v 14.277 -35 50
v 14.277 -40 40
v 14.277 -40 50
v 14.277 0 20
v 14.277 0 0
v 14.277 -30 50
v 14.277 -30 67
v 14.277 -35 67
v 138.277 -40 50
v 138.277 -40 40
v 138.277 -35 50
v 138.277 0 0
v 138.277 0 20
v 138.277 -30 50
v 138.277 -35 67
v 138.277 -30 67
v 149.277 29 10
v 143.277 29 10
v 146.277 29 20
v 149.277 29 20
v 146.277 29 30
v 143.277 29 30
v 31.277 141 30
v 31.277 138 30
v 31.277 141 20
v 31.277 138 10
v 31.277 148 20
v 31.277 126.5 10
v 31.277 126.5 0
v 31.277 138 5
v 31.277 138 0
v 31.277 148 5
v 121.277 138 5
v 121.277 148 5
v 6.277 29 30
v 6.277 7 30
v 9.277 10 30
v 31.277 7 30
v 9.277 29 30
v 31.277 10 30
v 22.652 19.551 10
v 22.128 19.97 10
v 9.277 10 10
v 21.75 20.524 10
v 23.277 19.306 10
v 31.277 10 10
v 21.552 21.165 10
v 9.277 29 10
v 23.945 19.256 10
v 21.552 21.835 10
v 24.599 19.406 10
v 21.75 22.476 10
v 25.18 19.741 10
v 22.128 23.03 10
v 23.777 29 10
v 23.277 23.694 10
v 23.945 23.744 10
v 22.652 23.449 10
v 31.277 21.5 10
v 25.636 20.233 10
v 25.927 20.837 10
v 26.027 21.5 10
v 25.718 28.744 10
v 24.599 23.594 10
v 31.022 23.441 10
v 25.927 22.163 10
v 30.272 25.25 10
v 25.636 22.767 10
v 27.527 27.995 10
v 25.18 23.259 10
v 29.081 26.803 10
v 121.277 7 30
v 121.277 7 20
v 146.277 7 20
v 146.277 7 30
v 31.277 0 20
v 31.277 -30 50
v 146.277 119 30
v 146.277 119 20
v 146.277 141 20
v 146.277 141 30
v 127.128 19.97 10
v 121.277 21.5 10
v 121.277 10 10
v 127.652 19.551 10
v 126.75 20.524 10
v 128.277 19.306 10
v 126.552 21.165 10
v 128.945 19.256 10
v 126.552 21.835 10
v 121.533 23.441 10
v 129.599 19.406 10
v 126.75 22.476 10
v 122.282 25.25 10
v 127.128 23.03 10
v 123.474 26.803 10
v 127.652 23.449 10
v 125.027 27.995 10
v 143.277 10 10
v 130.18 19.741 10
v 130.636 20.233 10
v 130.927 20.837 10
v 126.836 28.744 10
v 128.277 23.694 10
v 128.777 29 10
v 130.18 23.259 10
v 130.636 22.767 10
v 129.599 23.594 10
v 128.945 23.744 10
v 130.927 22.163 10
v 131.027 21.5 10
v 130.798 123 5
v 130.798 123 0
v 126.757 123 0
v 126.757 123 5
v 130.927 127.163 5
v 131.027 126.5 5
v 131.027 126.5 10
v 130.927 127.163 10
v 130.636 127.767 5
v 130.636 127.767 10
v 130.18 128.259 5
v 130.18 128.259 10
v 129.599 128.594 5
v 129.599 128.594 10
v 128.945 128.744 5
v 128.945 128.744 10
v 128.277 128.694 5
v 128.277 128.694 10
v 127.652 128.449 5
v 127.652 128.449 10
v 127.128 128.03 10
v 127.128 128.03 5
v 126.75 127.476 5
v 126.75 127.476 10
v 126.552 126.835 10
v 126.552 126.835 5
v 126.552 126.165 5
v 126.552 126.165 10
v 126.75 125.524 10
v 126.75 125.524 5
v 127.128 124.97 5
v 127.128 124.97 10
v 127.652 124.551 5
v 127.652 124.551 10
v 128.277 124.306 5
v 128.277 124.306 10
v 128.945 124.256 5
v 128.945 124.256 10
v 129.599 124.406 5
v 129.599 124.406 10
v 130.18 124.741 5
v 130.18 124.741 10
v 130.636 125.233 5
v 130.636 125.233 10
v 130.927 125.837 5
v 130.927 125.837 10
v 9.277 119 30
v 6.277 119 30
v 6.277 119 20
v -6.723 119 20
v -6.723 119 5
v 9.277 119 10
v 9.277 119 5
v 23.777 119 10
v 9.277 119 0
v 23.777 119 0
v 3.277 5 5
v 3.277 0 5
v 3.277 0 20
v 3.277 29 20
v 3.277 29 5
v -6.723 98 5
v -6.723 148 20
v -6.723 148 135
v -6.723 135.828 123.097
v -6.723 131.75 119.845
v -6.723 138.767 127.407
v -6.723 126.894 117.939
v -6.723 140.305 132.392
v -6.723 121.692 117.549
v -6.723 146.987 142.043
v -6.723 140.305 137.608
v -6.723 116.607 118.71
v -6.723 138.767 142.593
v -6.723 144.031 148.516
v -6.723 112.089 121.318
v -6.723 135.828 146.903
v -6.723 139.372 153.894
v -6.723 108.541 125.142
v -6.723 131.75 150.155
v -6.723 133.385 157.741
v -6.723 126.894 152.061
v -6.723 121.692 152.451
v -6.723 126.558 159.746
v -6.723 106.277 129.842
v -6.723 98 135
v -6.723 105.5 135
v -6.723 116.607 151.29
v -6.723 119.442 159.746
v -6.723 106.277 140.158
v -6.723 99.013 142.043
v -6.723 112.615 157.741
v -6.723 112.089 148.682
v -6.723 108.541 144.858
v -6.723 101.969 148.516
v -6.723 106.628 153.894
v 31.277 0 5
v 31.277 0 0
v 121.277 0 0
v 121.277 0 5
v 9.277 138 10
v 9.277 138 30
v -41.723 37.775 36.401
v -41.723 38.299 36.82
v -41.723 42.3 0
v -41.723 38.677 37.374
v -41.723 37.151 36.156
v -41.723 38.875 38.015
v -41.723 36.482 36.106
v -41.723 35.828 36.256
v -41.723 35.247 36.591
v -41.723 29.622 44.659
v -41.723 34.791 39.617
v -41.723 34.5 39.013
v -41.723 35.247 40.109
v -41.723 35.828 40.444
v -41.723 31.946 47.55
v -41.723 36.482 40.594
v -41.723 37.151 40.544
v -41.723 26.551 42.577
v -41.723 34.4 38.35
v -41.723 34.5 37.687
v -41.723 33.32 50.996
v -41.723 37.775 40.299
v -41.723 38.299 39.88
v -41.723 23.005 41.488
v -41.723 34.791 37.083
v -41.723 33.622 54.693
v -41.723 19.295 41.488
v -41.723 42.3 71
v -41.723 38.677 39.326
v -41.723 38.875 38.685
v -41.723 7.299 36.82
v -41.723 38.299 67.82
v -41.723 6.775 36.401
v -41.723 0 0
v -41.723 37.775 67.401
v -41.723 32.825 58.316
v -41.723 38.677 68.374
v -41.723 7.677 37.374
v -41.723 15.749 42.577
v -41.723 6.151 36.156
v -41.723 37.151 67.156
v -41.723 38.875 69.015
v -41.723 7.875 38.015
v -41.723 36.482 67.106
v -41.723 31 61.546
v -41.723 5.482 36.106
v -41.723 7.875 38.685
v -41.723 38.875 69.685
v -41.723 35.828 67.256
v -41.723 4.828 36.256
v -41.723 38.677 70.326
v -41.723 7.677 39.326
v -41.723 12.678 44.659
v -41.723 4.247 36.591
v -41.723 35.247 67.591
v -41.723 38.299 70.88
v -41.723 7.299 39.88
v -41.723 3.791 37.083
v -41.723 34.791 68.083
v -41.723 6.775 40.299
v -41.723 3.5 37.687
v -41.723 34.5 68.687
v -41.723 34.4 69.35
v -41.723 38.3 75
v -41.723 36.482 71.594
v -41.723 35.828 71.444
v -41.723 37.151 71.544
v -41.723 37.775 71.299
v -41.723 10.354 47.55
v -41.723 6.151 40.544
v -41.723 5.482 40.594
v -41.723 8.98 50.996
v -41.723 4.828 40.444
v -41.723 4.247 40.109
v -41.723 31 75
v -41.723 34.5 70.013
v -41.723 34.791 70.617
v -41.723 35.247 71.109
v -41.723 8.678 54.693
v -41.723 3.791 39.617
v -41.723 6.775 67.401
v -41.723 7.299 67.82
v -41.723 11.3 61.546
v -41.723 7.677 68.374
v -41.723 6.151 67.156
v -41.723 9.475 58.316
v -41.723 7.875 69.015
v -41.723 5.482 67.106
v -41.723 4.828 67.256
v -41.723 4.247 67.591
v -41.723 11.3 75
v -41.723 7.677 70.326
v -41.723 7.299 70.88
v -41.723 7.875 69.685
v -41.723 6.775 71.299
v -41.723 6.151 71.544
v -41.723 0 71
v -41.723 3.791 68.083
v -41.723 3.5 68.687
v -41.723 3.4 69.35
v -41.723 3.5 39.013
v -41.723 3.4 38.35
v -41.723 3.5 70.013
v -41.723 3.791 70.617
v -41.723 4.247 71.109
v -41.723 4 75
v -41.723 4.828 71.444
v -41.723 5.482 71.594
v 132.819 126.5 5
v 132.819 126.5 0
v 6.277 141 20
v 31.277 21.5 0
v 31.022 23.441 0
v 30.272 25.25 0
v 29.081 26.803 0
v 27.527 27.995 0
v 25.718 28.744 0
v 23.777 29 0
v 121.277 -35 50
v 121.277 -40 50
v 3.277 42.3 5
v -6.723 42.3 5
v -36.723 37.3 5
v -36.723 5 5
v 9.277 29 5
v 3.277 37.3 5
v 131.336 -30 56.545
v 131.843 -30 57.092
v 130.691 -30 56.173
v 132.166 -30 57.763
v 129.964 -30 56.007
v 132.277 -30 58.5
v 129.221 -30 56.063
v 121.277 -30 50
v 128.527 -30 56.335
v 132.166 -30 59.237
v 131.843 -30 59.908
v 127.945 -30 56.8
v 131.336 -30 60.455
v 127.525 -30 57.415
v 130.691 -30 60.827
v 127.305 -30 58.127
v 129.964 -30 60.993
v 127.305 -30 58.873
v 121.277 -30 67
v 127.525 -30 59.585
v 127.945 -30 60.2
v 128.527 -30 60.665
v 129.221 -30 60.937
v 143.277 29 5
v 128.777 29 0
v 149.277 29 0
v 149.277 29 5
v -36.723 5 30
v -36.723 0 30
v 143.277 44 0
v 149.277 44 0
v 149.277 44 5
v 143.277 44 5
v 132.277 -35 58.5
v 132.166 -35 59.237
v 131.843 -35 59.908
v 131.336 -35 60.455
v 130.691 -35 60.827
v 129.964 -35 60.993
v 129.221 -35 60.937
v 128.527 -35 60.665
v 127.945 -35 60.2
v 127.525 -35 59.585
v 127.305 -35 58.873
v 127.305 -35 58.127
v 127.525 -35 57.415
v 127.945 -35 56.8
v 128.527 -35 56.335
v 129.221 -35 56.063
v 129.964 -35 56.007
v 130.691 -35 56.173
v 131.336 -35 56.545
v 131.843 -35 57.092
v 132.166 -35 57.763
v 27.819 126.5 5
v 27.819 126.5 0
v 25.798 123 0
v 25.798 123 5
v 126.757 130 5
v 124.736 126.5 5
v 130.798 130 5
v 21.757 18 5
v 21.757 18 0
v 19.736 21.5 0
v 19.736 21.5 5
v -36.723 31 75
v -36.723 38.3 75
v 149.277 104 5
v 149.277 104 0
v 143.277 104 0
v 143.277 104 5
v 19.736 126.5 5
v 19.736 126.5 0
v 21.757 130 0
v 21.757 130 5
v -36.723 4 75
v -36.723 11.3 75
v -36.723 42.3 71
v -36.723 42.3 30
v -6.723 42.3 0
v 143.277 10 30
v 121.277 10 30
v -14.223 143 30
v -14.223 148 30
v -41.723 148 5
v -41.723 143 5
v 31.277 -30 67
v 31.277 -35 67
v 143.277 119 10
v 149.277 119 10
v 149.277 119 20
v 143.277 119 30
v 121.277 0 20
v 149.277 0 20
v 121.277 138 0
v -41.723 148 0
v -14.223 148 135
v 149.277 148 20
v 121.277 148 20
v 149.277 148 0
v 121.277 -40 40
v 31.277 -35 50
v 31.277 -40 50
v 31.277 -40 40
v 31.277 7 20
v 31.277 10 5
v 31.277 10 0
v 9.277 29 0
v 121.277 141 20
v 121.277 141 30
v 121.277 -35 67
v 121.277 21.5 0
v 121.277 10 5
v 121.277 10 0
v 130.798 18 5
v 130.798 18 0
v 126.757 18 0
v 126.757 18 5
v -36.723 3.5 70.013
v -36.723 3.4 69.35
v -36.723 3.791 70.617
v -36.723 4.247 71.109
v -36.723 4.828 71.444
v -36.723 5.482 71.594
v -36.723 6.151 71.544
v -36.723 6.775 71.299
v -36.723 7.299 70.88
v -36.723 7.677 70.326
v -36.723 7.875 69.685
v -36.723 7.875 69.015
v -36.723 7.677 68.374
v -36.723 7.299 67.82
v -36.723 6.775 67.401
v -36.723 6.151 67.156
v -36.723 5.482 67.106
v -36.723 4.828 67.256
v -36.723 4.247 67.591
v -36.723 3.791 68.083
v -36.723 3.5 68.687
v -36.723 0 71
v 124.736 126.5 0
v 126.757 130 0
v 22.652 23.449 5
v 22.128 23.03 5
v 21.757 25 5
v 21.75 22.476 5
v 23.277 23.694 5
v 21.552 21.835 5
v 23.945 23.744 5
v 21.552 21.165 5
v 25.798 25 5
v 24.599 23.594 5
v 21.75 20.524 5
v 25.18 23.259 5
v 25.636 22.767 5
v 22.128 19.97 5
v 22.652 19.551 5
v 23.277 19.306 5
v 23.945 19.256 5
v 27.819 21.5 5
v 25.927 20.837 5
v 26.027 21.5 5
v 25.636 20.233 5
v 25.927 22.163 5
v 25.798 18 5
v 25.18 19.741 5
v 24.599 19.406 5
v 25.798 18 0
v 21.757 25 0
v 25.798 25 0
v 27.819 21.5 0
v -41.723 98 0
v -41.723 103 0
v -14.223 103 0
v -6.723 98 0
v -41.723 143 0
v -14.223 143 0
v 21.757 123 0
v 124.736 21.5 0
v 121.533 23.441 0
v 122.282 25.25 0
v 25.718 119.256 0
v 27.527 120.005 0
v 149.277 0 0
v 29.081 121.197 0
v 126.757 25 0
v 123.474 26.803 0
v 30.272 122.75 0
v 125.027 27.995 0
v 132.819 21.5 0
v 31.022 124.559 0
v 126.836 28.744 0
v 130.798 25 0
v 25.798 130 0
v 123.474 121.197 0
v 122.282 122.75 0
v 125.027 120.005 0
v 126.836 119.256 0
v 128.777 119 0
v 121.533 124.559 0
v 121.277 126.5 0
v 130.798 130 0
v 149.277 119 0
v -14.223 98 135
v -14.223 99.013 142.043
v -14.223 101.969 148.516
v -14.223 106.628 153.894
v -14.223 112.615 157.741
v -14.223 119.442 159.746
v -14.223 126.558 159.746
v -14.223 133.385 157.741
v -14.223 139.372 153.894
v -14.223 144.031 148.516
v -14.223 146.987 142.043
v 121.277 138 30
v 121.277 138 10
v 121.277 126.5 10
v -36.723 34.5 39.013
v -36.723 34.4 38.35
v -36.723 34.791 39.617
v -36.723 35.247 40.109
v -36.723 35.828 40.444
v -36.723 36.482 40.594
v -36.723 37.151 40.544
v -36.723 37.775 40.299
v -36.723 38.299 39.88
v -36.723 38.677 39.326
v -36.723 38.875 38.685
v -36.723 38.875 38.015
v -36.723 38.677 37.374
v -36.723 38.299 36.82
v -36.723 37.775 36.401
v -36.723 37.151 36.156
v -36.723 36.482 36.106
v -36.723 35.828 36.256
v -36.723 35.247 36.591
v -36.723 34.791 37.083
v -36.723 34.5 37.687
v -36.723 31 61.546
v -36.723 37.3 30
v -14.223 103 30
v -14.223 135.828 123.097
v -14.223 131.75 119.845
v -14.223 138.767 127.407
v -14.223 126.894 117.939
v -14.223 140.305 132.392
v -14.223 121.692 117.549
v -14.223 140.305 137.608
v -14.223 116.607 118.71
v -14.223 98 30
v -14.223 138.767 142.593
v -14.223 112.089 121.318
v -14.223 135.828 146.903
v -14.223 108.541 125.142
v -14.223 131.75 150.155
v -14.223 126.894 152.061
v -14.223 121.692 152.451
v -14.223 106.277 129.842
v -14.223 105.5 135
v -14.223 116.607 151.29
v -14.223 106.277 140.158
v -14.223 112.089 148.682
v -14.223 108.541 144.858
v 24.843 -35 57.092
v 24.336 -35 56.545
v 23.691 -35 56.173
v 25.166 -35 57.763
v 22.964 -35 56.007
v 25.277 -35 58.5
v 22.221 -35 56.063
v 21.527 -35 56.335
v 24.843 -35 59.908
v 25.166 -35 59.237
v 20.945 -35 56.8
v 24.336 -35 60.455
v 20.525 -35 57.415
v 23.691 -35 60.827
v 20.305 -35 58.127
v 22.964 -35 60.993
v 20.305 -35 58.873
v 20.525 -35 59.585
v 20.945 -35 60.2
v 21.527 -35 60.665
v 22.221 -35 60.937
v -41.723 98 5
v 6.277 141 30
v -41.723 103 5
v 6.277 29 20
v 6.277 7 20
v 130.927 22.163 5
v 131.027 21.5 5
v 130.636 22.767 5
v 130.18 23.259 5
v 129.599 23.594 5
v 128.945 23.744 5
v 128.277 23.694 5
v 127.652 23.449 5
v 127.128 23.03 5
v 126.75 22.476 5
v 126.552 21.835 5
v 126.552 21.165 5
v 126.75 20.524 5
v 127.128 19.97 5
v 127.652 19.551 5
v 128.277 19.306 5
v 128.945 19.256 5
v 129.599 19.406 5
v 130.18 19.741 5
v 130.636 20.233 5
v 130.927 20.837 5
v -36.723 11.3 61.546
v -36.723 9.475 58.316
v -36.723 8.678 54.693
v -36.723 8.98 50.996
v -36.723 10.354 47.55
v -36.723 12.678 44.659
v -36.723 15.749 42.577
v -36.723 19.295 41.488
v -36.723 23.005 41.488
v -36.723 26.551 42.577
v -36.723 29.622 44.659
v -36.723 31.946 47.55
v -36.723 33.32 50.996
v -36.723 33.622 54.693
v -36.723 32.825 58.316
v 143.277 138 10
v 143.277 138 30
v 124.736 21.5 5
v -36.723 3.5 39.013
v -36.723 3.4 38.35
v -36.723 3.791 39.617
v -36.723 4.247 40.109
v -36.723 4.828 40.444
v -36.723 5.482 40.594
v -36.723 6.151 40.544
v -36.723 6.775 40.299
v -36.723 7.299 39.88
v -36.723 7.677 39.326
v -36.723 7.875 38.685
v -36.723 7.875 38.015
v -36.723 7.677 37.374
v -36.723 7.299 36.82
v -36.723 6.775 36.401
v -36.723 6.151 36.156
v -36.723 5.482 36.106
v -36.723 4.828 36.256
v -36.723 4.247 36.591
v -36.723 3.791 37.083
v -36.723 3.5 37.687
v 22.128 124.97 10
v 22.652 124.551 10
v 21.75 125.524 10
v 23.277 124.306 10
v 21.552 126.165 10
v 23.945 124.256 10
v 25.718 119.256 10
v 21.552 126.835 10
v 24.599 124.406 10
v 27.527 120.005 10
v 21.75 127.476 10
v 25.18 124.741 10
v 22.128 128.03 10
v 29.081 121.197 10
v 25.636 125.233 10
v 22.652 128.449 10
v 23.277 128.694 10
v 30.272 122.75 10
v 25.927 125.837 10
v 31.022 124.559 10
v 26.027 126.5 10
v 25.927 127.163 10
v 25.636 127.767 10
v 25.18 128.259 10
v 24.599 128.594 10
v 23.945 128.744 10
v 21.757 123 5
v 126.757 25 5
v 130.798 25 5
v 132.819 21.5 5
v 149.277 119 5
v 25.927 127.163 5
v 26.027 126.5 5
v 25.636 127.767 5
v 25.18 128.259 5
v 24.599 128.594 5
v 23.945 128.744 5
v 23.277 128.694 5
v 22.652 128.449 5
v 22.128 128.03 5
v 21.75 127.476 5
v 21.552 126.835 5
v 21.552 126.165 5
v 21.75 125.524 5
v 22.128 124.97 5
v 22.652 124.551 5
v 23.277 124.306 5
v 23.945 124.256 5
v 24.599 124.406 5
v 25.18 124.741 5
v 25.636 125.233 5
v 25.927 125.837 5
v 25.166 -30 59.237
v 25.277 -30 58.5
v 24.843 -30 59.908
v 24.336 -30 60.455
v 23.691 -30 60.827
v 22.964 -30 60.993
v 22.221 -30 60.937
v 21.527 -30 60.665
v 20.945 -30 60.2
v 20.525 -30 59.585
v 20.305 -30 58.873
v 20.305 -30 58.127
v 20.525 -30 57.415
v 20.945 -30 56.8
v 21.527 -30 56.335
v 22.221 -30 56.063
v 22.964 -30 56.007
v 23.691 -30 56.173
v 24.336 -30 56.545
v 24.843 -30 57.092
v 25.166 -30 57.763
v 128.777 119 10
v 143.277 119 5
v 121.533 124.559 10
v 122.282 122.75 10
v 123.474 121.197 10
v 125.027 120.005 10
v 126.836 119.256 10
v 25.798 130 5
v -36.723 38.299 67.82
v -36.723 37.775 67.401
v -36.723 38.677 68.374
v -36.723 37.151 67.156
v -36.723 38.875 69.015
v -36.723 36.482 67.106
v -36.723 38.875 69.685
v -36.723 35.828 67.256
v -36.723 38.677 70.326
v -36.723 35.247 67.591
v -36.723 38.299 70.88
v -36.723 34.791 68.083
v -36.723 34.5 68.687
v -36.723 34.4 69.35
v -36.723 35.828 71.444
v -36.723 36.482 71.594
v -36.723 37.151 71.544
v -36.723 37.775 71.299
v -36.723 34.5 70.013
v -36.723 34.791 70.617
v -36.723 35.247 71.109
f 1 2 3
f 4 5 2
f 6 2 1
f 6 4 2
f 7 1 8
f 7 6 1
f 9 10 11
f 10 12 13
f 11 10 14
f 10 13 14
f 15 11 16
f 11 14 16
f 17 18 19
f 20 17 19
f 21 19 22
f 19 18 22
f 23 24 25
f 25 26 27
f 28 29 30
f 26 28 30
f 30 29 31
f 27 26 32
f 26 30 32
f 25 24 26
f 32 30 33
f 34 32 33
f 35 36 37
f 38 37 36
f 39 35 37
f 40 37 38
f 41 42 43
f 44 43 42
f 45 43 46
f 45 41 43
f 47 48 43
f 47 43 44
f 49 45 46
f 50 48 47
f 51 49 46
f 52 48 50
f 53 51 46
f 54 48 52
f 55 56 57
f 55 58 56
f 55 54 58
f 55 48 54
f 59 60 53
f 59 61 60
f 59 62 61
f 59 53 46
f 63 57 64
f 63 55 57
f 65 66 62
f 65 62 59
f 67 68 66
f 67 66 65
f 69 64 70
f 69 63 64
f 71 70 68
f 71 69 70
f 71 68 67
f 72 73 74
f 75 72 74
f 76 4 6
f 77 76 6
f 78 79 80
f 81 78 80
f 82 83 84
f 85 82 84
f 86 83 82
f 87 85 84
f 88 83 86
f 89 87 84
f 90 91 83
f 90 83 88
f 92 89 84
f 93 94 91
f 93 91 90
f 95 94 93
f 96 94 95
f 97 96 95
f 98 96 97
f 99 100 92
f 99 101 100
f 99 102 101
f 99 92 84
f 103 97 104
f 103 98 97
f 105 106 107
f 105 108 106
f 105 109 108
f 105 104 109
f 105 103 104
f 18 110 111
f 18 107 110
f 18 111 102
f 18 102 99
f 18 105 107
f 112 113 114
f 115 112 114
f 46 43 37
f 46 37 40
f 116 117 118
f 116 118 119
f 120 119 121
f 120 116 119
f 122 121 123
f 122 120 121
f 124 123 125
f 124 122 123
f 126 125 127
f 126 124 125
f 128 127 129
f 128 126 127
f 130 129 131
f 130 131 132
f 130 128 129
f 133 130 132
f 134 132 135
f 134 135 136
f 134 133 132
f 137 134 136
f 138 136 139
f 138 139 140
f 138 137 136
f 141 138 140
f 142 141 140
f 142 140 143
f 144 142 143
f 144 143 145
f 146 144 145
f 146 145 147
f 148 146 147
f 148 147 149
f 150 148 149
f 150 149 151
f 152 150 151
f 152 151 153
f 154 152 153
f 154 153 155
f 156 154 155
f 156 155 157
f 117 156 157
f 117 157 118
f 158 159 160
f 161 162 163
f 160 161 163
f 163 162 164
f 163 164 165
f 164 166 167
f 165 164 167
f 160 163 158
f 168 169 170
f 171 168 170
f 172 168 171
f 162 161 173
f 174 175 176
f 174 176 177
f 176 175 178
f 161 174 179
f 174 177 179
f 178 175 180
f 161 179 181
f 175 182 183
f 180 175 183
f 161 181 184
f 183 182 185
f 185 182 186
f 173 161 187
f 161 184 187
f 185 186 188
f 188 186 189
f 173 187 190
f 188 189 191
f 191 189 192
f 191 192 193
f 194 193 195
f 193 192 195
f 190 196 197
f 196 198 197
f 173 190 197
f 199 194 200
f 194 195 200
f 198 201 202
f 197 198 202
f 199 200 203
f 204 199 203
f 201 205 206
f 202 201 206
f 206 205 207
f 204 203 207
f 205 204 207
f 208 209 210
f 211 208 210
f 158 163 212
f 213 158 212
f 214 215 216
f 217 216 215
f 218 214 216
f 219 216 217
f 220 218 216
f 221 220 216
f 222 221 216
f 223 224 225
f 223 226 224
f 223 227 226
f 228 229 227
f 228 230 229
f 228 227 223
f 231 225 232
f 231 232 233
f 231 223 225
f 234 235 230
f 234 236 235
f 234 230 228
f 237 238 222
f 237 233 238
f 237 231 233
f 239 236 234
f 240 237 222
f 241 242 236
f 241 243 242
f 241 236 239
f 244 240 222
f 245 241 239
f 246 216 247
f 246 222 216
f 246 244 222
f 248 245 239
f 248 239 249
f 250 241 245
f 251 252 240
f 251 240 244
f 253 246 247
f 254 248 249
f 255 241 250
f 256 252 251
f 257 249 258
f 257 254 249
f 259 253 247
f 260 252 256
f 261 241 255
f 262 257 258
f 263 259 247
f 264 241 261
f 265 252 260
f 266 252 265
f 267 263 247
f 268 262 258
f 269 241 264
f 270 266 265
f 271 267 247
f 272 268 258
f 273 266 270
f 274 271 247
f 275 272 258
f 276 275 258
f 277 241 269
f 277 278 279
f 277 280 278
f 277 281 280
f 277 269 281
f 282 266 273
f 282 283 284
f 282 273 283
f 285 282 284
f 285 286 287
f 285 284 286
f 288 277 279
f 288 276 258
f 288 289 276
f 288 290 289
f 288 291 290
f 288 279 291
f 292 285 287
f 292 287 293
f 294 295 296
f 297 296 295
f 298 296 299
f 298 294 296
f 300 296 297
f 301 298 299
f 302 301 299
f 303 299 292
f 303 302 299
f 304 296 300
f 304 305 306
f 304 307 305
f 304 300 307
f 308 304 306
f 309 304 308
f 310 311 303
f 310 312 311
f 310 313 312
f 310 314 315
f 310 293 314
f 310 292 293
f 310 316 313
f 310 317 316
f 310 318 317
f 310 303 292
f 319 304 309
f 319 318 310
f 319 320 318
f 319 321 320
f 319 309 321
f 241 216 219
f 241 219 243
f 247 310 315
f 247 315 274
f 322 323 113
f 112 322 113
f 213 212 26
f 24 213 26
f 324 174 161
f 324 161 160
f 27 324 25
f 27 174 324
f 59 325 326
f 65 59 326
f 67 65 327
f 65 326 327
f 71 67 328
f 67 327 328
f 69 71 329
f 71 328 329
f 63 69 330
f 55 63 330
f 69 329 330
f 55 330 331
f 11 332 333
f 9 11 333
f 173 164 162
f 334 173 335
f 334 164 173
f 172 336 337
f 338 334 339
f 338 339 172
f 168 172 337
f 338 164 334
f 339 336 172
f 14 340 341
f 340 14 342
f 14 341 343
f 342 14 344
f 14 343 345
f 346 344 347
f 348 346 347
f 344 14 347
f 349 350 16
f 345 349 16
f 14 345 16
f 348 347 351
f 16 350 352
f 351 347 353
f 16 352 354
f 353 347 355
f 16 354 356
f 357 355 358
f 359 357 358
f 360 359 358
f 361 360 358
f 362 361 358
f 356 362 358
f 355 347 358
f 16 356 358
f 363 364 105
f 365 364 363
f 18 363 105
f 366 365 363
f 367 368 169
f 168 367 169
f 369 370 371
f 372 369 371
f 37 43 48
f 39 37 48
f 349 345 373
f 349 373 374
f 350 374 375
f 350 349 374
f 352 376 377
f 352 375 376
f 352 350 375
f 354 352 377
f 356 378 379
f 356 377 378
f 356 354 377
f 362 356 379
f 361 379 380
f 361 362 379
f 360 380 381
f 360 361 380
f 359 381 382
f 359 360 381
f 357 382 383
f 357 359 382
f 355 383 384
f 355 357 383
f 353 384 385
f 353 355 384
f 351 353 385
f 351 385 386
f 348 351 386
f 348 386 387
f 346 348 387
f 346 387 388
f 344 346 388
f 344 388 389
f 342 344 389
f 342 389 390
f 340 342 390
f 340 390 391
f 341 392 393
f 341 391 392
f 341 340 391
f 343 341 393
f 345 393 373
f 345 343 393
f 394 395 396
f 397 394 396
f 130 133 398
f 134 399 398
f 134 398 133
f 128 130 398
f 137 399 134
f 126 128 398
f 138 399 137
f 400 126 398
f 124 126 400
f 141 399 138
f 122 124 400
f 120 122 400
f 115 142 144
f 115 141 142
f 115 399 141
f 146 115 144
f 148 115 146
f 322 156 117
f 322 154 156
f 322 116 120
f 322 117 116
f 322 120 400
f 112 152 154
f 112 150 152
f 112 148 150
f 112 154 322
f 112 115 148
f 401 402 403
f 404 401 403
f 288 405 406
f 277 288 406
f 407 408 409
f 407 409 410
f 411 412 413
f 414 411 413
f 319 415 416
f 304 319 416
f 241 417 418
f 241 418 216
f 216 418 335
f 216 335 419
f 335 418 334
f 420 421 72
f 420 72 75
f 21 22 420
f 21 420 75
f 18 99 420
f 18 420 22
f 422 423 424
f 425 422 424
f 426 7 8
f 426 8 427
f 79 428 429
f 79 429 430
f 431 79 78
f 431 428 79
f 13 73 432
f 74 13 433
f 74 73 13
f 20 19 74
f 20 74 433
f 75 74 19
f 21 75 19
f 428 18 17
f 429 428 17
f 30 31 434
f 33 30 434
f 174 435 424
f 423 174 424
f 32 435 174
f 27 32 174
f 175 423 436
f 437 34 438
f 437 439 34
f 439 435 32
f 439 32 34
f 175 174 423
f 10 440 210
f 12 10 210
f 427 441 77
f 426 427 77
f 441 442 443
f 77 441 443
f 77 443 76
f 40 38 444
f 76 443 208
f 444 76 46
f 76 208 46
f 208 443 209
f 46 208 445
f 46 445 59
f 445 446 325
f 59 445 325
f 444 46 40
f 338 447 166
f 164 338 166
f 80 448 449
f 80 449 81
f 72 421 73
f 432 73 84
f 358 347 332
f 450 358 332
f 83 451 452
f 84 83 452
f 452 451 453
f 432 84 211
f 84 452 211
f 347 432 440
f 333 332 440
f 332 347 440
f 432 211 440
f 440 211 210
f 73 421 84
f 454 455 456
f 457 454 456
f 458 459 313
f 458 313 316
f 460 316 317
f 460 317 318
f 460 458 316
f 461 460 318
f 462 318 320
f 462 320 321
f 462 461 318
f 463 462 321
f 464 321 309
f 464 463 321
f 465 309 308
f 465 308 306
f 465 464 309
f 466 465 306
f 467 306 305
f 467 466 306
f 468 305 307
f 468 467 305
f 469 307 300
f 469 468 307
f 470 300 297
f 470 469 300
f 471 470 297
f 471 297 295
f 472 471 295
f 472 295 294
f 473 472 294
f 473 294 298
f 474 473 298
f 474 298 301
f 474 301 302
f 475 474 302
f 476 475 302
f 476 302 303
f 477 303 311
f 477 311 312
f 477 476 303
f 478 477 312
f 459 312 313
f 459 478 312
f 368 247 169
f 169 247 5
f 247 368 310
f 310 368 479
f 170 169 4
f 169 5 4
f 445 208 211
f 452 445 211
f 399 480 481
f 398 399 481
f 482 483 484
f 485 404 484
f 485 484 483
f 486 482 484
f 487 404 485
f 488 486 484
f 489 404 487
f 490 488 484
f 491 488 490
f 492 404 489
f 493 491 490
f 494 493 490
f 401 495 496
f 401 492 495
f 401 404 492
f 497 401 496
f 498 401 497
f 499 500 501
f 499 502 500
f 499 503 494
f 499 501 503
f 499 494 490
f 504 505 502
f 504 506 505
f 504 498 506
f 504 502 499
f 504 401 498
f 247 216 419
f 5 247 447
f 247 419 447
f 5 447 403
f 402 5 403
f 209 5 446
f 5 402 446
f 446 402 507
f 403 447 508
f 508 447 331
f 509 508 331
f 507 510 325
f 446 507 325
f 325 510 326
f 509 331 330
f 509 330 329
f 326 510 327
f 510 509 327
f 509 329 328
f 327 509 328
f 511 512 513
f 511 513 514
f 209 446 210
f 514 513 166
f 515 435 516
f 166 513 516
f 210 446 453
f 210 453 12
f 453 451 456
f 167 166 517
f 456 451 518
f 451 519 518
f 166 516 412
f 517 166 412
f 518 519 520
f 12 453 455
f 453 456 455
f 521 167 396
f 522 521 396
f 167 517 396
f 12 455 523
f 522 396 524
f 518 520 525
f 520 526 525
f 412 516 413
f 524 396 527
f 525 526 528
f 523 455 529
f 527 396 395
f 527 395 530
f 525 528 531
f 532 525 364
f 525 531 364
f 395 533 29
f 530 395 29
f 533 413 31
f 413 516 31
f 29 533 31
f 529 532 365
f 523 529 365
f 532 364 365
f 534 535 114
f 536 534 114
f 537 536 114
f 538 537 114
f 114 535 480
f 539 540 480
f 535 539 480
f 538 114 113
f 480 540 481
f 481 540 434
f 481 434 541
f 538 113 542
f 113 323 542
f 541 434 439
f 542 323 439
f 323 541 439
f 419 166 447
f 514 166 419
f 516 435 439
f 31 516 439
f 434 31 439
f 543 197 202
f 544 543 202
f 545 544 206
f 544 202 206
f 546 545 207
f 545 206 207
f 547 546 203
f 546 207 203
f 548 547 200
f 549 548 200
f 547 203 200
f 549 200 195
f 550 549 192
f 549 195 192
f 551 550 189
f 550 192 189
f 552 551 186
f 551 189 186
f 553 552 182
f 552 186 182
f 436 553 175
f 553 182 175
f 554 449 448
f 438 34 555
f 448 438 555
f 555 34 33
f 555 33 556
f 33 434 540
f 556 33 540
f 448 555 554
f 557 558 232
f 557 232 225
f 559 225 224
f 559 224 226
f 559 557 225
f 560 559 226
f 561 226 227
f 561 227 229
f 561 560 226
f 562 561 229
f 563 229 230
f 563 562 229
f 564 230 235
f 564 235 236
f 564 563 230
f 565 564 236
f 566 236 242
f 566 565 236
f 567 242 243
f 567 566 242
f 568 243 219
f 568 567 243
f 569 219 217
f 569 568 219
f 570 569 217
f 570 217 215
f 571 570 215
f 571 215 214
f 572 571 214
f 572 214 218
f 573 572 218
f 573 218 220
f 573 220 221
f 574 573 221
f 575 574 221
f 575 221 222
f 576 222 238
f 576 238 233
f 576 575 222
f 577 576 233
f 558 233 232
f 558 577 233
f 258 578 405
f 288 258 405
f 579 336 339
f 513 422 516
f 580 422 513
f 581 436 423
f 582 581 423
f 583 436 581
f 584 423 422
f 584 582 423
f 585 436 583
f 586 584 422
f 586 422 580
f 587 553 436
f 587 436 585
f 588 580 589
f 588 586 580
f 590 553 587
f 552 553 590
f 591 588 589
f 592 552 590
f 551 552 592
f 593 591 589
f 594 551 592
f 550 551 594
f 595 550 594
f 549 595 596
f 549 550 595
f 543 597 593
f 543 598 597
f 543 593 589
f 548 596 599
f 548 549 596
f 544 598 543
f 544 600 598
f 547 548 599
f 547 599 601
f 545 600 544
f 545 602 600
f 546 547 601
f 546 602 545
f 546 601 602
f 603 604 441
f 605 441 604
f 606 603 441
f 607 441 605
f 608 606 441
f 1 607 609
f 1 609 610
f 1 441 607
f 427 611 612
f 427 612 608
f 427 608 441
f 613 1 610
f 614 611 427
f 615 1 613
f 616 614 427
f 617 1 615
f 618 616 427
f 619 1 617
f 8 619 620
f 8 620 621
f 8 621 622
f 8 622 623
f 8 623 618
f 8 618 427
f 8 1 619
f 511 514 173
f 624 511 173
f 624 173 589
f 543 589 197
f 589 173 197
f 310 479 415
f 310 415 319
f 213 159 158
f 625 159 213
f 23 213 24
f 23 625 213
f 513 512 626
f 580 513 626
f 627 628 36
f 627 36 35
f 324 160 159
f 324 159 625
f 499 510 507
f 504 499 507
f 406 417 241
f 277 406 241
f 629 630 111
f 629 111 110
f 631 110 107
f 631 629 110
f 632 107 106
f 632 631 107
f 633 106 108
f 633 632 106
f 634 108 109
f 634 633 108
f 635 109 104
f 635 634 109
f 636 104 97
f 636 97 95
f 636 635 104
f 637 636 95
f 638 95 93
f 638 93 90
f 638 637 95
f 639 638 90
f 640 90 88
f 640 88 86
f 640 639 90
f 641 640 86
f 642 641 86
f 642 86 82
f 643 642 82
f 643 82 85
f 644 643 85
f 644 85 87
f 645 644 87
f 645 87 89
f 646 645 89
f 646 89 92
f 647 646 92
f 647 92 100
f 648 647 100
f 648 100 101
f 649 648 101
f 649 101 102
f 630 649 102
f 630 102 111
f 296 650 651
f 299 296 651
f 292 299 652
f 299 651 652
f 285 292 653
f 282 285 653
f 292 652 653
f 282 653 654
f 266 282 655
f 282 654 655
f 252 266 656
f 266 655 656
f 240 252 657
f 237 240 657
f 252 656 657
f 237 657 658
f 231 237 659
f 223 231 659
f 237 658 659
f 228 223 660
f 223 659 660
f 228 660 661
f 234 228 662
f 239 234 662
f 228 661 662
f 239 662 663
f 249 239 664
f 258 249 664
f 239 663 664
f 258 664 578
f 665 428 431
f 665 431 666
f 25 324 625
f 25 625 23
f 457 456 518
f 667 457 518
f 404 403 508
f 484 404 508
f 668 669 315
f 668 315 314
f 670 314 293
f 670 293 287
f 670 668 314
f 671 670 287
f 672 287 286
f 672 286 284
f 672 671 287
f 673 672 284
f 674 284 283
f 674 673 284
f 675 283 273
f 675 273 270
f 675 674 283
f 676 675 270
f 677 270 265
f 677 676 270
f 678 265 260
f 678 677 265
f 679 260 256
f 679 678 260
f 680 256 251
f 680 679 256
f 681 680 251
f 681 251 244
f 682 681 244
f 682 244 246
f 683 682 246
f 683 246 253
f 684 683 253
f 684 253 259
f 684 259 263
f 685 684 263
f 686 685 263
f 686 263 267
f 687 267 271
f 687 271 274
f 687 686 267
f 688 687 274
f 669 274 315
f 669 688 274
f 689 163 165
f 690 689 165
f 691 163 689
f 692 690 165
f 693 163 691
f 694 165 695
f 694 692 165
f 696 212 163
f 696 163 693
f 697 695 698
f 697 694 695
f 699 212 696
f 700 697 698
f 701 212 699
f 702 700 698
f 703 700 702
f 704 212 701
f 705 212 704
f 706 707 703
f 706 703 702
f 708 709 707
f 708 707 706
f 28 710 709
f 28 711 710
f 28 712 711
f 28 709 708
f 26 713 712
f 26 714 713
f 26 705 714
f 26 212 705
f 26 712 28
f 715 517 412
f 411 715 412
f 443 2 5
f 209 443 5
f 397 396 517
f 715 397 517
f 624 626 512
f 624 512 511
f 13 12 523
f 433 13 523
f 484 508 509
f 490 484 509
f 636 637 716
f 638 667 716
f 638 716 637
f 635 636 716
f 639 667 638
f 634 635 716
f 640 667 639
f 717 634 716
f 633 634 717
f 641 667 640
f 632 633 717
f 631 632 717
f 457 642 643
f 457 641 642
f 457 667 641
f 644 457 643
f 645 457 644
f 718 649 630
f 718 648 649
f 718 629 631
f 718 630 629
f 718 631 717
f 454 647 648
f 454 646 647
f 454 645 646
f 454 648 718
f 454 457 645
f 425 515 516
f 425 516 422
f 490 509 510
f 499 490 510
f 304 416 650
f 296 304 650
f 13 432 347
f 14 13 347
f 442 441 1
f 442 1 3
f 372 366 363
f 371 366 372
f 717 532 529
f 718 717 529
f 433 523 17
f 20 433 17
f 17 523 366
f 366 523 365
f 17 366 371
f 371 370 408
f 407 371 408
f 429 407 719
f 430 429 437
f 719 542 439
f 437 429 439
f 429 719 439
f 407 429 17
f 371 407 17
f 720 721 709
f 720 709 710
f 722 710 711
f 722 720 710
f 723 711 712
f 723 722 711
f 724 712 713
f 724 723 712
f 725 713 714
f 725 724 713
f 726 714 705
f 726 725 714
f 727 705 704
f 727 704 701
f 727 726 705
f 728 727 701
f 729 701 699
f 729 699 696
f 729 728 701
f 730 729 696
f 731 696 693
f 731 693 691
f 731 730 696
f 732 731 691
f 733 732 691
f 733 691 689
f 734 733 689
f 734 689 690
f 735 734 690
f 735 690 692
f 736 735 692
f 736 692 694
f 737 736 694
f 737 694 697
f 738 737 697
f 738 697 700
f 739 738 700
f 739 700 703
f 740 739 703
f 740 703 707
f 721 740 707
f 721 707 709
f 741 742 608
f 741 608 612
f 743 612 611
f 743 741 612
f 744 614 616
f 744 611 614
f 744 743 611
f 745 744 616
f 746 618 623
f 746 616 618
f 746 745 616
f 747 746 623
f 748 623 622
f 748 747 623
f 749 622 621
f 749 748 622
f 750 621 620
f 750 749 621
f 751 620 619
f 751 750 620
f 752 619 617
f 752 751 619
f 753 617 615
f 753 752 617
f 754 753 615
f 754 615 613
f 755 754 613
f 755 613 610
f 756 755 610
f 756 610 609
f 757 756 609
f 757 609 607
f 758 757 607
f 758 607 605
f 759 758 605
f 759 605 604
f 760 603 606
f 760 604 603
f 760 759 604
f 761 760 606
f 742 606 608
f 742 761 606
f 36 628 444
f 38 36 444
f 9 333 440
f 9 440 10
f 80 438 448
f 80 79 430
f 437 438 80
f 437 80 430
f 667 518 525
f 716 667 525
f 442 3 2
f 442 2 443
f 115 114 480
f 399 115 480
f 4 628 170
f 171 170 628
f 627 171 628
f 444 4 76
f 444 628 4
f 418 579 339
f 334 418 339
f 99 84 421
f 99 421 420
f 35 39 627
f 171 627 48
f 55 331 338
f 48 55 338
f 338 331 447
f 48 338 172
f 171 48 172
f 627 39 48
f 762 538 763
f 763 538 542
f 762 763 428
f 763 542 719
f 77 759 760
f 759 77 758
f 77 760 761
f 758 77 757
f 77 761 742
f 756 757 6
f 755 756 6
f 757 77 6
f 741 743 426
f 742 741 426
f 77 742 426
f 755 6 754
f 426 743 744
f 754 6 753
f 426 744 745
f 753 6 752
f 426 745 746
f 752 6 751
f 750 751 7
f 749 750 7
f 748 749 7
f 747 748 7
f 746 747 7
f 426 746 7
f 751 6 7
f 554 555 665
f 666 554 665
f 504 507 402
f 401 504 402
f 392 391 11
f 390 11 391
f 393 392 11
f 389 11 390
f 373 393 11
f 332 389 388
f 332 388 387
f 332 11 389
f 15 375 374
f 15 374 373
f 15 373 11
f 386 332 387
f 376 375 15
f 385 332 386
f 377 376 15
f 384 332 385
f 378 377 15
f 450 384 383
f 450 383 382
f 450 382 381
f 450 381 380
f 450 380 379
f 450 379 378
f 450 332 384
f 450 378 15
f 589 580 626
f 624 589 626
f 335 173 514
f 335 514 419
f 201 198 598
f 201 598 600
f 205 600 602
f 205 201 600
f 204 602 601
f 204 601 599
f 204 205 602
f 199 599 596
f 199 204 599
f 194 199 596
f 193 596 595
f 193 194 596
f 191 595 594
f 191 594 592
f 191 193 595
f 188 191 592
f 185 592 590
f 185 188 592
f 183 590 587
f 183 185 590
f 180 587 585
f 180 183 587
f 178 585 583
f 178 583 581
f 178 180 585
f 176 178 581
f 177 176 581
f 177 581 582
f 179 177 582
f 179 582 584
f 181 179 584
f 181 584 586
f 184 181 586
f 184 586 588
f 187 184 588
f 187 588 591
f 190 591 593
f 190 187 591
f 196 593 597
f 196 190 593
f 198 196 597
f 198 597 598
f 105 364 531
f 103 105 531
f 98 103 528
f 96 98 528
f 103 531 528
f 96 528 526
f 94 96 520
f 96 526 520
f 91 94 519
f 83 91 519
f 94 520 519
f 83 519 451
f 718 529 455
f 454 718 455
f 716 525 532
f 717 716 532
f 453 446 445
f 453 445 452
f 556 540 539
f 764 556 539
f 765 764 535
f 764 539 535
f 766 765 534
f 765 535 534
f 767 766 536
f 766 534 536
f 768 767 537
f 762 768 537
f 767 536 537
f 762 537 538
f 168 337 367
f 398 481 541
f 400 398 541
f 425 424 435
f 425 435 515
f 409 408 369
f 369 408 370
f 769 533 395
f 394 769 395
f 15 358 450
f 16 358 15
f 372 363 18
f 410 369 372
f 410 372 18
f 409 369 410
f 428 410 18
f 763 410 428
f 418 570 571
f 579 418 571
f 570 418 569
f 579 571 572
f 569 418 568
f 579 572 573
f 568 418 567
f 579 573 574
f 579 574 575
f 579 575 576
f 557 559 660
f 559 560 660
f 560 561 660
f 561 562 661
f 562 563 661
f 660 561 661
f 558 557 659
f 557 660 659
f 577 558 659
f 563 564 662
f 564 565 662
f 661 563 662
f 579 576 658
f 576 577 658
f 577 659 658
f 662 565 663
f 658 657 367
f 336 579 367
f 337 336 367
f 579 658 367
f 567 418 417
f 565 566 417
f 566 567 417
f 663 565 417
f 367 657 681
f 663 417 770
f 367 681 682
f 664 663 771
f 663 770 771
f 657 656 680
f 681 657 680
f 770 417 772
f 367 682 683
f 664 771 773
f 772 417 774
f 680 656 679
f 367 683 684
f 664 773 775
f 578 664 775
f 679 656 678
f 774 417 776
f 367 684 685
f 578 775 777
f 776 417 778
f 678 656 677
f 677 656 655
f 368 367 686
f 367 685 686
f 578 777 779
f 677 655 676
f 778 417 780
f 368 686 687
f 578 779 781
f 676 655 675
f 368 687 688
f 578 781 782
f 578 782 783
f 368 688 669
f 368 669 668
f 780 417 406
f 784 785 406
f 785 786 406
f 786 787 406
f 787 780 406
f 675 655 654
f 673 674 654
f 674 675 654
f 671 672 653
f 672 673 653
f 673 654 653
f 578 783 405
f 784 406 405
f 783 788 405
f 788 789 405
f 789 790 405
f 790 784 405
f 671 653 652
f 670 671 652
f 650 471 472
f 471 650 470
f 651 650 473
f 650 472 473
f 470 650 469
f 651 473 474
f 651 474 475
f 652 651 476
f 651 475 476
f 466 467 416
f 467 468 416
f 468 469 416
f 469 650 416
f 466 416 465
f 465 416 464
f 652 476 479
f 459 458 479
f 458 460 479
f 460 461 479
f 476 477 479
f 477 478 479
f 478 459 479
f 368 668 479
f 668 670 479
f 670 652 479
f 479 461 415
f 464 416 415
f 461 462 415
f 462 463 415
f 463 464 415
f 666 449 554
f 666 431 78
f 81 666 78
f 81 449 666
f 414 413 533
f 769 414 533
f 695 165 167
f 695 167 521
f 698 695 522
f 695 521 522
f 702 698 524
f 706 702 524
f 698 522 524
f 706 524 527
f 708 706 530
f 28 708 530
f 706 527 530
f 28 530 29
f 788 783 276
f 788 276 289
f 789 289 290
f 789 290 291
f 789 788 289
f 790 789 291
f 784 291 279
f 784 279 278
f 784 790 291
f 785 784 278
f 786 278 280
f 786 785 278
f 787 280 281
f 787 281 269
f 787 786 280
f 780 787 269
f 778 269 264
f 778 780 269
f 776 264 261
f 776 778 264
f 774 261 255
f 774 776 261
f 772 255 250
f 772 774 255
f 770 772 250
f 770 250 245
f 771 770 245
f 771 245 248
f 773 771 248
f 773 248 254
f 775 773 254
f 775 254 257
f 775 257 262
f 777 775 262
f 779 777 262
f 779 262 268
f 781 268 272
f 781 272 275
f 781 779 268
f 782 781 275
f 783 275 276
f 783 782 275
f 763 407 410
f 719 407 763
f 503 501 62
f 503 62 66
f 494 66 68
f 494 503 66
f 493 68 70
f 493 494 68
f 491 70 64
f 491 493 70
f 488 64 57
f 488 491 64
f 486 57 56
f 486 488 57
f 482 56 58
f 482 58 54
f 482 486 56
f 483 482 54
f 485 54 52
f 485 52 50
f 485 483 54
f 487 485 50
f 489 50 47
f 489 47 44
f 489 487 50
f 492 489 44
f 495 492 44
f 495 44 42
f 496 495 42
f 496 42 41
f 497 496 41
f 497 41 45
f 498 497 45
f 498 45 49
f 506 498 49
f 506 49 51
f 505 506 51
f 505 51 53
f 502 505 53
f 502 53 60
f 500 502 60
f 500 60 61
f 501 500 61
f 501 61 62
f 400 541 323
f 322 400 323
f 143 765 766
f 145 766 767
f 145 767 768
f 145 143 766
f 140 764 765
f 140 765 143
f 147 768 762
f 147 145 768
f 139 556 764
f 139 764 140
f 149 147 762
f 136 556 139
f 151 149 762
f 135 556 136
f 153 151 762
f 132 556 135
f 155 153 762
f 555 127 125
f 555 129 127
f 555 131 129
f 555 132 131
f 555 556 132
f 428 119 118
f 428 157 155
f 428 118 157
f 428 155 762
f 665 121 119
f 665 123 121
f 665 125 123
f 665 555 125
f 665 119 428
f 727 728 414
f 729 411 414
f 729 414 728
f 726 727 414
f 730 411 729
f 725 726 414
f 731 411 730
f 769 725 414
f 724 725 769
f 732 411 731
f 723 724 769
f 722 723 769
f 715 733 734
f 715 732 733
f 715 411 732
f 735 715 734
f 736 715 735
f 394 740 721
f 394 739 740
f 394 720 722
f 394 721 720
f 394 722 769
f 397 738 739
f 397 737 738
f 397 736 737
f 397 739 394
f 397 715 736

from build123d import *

# Parameters (mm, degrees)
F0_W      = 146
F0_H      = 148
F0_W_2    = 134
F0_H_2    = 128
F1_DEPTH  = 20
F2_W      = 140
F2_H      = 134
F2_W_2    = 134
F2_H_2    = 128
F3_DEPTH  = 10
F4_W      = 90
F4_H      = 25
F5_DEPTH  = 149.278288
F6_W      = 90
F6_H      = 25
F7_DEPTH  = 148.001
F8_W      = 17
F8_H      = 67
F8_R      = 2.5
F9_DEPTH  = 40
F10_W     = 5
F10_H     = 17
F11_DEPTH = 135.001
F12_W     = 148
F12_H     = 5
F13_DEPTH = 10
F14_R     = 17.5
F15_DEPTH = 7.5
F16_W     = 10
F16_H     = 29
F17_DEPTH = 15
F18_W     = 6
F18_H     = 90
F19_DEPTH = 5
F20_W     = 15
F20_H     = 5
F21_DEPTH = 6
F23_W     = 42.3
F23_H     = 5
F24_DEPTH = 30
F25_R     = 2.25
F26_DEPTH = 5
F27_SIZE  = 4
F28_W     = 40
F28_H     = 5
F29_DEPTH = 25
F31_DEPTH = 42.3
F32_W     = 5
F32_H     = 30
F33_DEPTH = 27.5
F35_DEPTH = 50
F36_R     = 2.25
F37_DEPTH = 10
F39_DEPTH = 5


with BuildPart() as f1:
    # F0 (on Top) → F1 (new body)
    with BuildSketch(Plane.XY):
        with Locations((76.277288, 74)):
            Rectangle(F0_W, F0_H)
        with Locations((76.277288, 74)):
            Rectangle(F0_W_2, F0_H_2, mode=Mode.SUBTRACT)
    extrude(amount=F1_DEPTH)

    # F2 (on face) → F3 (join)
    with BuildSketch(Plane.XY.offset(20)):
        with Locations((76.277288, 74)):
            Rectangle(F2_W, F2_H)
        with Locations((76.277288, 74)):
            Rectangle(F2_W_2, F2_H_2, mode=Mode.SUBTRACT)
    extrude(amount=F3_DEPTH)

    # F4 (on Right) → F5 (cut, through all)
    with BuildSketch(Plane.YZ):
        with Locations((74, 17.5)):
            Rectangle(F4_W, F4_H)
    extrude(amount=F5_DEPTH, mode=Mode.SUBTRACT)

    # F6 (on Front) → F7 (cut, through all)
    with BuildSketch(Plane.XZ):
        with Locations((76.277288, 17.5)):
            Rectangle(F6_W, F6_H)
    extrude(amount=-F7_DEPTH, mode=Mode.SUBTRACT)

    # F8 (on face) → F9 (join)
    with BuildSketch(Plane.XZ):
        with Locations((22.777288, 33.5)):
            Rectangle(F8_W, F8_H)
        with Locations((22.777288, 58.5)):
            Circle(F8_R, mode=Mode.SUBTRACT)
        with Locations((129.777288, 33.5)):
            Rectangle(F8_W, F8_H)
        with Locations((129.777288, 58.5)):
            Circle(F8_R, mode=Mode.SUBTRACT)
    extrude(amount=F9_DEPTH)

    # F10 (on face) → F11 (cut, through all)
    with BuildSketch(Plane(origin=(14.277288, 0, 0), x_dir=(0, -1, 0), z_dir=(-1, 0, 0))):
        Polygon((0, 67), (0, 20), (30, 50), (30, 67), align=None)
        with Locations((37.5, 58.5)):
            Rectangle(F10_W, F10_H)
        Polygon((40, 40), (0, 0), (40, 0), align=None)
    extrude(amount=-F11_DEPTH, mode=Mode.SUBTRACT)

    # F12 (on face) → F13 (join)
    with BuildSketch(Plane(origin=(3.277288, 0, 0), x_dir=(0, -1, 0), z_dir=(-1, 0, 0))):
        with Locations((-74, 2.5)):
            Rectangle(F12_W, F12_H)
    extrude(amount=F13_DEPTH)

    # F14 (on face) → F15 (join)
    with BuildSketch(Plane(origin=(-6.722712, 0, 0), x_dir=(0, -1, 0), z_dir=(-1, 0, 0))):
        with BuildLine():
            Line((-148, 135), (-148, 0))
            Line((-148, 0), (-98, 0))
            Line((-98, 0), (-98, 135))
            ThreePointArc((-98, 135), (-123, 160), (-148, 135))
        make_face()
        with Locations((-123, 135)):
            Circle(F14_R, mode=Mode.SUBTRACT)
    extrude(amount=F15_DEPTH)

    # F16 (on face) → F17 (join, through all)
    with BuildSketch(Plane.XY.offset(5)):
        with Locations((-1.722712, 133.5)):
            Rectangle(F16_W, F16_H)
    extrude(amount=F17_DEPTH)

    # F18 (on face) → F19 (join)
    with BuildSketch(Plane.XY.offset(5)):
        with Locations((146.277288, 74)):
            Rectangle(F18_W, F18_H)
    extrude(amount=F19_DEPTH)

    # F20 (on face) → F21 (cut, through all)
    with BuildSketch(Plane.YZ.offset(149.277288)):
        with Locations((36.5, 2.5)):
            Rectangle(F20_W, F20_H)
        with Locations((111.5, 2.5)):
            Rectangle(F20_W, F20_H)
    extrude(amount=-F21_DEPTH, mode=Mode.SUBTRACT)

    # F23 (on face) → F24 (join)
    with BuildSketch(Plane(origin=(-6.722712, 0, 0), x_dir=(0, -1, 0), z_dir=(-1, 0, 0))):
        with Locations((-21.15, 2.5)):
            Rectangle(F23_W, F23_H)
    extrude(amount=F24_DEPTH)

    # F25 (on face) → F26 (join)
    with BuildSketch(Plane(origin=(-36.722712, 0, 0), x_dir=(0, -1, 0), z_dir=(-1, 0, 0))):
        with BuildLine():
            Line((-42.3, 75), (-42.3, 0))
            Line((-42.3, 0), (0, 0))
            Line((0, 0), (0, 75))
            Line((0, 75), (-11.3, 75))
            Line((-11.3, 75), (-11.3, 61.54594))
            ThreePointArc((-11.3, 61.54594), (-21.15, 41.35), (-31, 61.54594))
            Line((-31, 61.54594), (-31, 75))
            Line((-31, 75), (-42.3, 75))
        make_face()
        with Locations((-36.65, 38.35)):
            Circle(F25_R, mode=Mode.SUBTRACT)
        with Locations((-36.65, 69.35)):
            Circle(F25_R, mode=Mode.SUBTRACT)
        with Locations((-5.65, 38.35)):
            Circle(F25_R, mode=Mode.SUBTRACT)
        with Locations((-5.65, 69.35)):
            Circle(F25_R, mode=Mode.SUBTRACT)
    extrude(amount=F26_DEPTH)

    # F27
    f27_edges = [f1.edges().sort_by_distance(p)[0] for p in [
        (-39.222712, 42.3, 75),
        (-39.222712, 0, 75),
    ]]
    chamfer(f27_edges, length=F27_SIZE)

    # F28 (on face) → F29 (join)
    with BuildSketch(Plane.XY.offset(5)):
        with Locations((-16.722712, 39.8)):
            Rectangle(F28_W, F28_H)
        with Locations((-16.722712, 2.5)):
            Rectangle(F28_W, F28_H)
    extrude(amount=F29_DEPTH)

    # F30 (on face) → F31 (cut, through all)
    with BuildSketch(Plane.XZ):
        Polygon((3.277288, 30), (-36.722712, 30), (3.277288, 5), align=None)
    extrude(amount=-F31_DEPTH, mode=Mode.SUBTRACT)

    # F32 (on face) → F33 (join, through all)
    with BuildSketch(Plane(origin=(-14.222712, 0, 0), x_dir=(0, -1, 0), z_dir=(-1, 0, 0))):
        with Locations((-145.5, 15)):
            Rectangle(F32_W, F32_H)
        with Locations((-100.5, 15)):
            Rectangle(F32_W, F32_H)
    extrude(amount=F33_DEPTH)

    # F34 (on face) → F35 (cut, through all)
    with BuildSketch(Plane(origin=(0, 148, 0), x_dir=(-1, 0, 0), z_dir=(0, 1, 0))):
        Polygon((41.722712, 5), (41.722712, 30), (14.222712, 30), align=None)
    extrude(amount=-F35_DEPTH, mode=Mode.SUBTRACT)

    # F36 (on Top) → F37 (join)
    with BuildSketch(Plane.XY):
        with BuildLine():
            Line((31.277288, 10), (31.277288, 21.5))
            ThreePointArc((31.277288, 21.5), (29.080588, 26.803301), (23.777288, 29))
            Line((23.777288, 29), (9.277288, 29))
            Line((9.277288, 29), (9.277288, 10))
            Line((9.277288, 10), (31.277288, 10))
        make_face()
        with Locations((23.777288, 21.5)):
            Circle(F36_R, mode=Mode.SUBTRACT)
        with BuildLine():
            Line((121.277288, 21.5), (121.277288, 10))
            Line((121.277288, 10), (143.277288, 10))
            Line((143.277288, 10), (143.277288, 29))
            Line((143.277288, 29), (128.777288, 29))
            ThreePointArc((128.777288, 29), (123.473987, 26.803301), (121.277288, 21.5))
        make_face()
        with Locations((128.777288, 21.5)):
            Circle(F36_R, mode=Mode.SUBTRACT)
        with BuildLine():
            Line((143.277288, 138), (121.277288, 138))
            Line((121.277288, 138), (121.277288, 126.5))
            ThreePointArc((121.277288, 126.5), (123.473987, 121.196699), (128.777288, 119))
            Line((128.777288, 119), (143.277288, 119))
            Line((143.277288, 119), (143.277288, 138))
        make_face()
        with Locations((128.777288, 126.5)):
            Circle(F36_R, mode=Mode.SUBTRACT)
        with BuildLine():
            Line((31.277288, 126.5), (31.277288, 138))
            Line((31.277288, 138), (9.277288, 138))
            Line((9.277288, 138), (9.277288, 119))
            Line((9.277288, 119), (23.777288, 119))
            ThreePointArc((23.777288, 119), (29.080588, 121.196699), (31.277288, 126.5))
        make_face()
        with Locations((23.777288, 126.5)):
            Circle(F36_R, mode=Mode.SUBTRACT)
    extrude(amount=F37_DEPTH)

    # F38 (on face) → F39 (cut)
    with BuildSketch(Plane(origin=(0, 0, 0), x_dir=(1, 0, 0), z_dir=(0, 0, -1))):
        Polygon((25.798014, -18), (21.756562, -18), (19.735836, -21.5), (21.756562, -25), (25.798014, -25), (27.818739, -21.5), align=None)
        Polygon((126.756562, -18), (124.735836, -21.5), (126.756562, -25), (130.798014, -25), (132.818739, -21.5), (130.798014, -18), align=None)
        Polygon((126.756562, -130), (130.798014, -130), (132.818739, -126.5), (130.798014, -123), (126.756562, -123), (124.735836, -126.5), align=None)
        Polygon((25.798014, -130), (27.818739, -126.5), (25.798014, -123), (21.756562, -123), (19.735836, -126.5), (21.756562, -130), align=None)
    extrude(amount=-F39_DEPTH, mode=Mode.SUBTRACT)


solid = f1.part
